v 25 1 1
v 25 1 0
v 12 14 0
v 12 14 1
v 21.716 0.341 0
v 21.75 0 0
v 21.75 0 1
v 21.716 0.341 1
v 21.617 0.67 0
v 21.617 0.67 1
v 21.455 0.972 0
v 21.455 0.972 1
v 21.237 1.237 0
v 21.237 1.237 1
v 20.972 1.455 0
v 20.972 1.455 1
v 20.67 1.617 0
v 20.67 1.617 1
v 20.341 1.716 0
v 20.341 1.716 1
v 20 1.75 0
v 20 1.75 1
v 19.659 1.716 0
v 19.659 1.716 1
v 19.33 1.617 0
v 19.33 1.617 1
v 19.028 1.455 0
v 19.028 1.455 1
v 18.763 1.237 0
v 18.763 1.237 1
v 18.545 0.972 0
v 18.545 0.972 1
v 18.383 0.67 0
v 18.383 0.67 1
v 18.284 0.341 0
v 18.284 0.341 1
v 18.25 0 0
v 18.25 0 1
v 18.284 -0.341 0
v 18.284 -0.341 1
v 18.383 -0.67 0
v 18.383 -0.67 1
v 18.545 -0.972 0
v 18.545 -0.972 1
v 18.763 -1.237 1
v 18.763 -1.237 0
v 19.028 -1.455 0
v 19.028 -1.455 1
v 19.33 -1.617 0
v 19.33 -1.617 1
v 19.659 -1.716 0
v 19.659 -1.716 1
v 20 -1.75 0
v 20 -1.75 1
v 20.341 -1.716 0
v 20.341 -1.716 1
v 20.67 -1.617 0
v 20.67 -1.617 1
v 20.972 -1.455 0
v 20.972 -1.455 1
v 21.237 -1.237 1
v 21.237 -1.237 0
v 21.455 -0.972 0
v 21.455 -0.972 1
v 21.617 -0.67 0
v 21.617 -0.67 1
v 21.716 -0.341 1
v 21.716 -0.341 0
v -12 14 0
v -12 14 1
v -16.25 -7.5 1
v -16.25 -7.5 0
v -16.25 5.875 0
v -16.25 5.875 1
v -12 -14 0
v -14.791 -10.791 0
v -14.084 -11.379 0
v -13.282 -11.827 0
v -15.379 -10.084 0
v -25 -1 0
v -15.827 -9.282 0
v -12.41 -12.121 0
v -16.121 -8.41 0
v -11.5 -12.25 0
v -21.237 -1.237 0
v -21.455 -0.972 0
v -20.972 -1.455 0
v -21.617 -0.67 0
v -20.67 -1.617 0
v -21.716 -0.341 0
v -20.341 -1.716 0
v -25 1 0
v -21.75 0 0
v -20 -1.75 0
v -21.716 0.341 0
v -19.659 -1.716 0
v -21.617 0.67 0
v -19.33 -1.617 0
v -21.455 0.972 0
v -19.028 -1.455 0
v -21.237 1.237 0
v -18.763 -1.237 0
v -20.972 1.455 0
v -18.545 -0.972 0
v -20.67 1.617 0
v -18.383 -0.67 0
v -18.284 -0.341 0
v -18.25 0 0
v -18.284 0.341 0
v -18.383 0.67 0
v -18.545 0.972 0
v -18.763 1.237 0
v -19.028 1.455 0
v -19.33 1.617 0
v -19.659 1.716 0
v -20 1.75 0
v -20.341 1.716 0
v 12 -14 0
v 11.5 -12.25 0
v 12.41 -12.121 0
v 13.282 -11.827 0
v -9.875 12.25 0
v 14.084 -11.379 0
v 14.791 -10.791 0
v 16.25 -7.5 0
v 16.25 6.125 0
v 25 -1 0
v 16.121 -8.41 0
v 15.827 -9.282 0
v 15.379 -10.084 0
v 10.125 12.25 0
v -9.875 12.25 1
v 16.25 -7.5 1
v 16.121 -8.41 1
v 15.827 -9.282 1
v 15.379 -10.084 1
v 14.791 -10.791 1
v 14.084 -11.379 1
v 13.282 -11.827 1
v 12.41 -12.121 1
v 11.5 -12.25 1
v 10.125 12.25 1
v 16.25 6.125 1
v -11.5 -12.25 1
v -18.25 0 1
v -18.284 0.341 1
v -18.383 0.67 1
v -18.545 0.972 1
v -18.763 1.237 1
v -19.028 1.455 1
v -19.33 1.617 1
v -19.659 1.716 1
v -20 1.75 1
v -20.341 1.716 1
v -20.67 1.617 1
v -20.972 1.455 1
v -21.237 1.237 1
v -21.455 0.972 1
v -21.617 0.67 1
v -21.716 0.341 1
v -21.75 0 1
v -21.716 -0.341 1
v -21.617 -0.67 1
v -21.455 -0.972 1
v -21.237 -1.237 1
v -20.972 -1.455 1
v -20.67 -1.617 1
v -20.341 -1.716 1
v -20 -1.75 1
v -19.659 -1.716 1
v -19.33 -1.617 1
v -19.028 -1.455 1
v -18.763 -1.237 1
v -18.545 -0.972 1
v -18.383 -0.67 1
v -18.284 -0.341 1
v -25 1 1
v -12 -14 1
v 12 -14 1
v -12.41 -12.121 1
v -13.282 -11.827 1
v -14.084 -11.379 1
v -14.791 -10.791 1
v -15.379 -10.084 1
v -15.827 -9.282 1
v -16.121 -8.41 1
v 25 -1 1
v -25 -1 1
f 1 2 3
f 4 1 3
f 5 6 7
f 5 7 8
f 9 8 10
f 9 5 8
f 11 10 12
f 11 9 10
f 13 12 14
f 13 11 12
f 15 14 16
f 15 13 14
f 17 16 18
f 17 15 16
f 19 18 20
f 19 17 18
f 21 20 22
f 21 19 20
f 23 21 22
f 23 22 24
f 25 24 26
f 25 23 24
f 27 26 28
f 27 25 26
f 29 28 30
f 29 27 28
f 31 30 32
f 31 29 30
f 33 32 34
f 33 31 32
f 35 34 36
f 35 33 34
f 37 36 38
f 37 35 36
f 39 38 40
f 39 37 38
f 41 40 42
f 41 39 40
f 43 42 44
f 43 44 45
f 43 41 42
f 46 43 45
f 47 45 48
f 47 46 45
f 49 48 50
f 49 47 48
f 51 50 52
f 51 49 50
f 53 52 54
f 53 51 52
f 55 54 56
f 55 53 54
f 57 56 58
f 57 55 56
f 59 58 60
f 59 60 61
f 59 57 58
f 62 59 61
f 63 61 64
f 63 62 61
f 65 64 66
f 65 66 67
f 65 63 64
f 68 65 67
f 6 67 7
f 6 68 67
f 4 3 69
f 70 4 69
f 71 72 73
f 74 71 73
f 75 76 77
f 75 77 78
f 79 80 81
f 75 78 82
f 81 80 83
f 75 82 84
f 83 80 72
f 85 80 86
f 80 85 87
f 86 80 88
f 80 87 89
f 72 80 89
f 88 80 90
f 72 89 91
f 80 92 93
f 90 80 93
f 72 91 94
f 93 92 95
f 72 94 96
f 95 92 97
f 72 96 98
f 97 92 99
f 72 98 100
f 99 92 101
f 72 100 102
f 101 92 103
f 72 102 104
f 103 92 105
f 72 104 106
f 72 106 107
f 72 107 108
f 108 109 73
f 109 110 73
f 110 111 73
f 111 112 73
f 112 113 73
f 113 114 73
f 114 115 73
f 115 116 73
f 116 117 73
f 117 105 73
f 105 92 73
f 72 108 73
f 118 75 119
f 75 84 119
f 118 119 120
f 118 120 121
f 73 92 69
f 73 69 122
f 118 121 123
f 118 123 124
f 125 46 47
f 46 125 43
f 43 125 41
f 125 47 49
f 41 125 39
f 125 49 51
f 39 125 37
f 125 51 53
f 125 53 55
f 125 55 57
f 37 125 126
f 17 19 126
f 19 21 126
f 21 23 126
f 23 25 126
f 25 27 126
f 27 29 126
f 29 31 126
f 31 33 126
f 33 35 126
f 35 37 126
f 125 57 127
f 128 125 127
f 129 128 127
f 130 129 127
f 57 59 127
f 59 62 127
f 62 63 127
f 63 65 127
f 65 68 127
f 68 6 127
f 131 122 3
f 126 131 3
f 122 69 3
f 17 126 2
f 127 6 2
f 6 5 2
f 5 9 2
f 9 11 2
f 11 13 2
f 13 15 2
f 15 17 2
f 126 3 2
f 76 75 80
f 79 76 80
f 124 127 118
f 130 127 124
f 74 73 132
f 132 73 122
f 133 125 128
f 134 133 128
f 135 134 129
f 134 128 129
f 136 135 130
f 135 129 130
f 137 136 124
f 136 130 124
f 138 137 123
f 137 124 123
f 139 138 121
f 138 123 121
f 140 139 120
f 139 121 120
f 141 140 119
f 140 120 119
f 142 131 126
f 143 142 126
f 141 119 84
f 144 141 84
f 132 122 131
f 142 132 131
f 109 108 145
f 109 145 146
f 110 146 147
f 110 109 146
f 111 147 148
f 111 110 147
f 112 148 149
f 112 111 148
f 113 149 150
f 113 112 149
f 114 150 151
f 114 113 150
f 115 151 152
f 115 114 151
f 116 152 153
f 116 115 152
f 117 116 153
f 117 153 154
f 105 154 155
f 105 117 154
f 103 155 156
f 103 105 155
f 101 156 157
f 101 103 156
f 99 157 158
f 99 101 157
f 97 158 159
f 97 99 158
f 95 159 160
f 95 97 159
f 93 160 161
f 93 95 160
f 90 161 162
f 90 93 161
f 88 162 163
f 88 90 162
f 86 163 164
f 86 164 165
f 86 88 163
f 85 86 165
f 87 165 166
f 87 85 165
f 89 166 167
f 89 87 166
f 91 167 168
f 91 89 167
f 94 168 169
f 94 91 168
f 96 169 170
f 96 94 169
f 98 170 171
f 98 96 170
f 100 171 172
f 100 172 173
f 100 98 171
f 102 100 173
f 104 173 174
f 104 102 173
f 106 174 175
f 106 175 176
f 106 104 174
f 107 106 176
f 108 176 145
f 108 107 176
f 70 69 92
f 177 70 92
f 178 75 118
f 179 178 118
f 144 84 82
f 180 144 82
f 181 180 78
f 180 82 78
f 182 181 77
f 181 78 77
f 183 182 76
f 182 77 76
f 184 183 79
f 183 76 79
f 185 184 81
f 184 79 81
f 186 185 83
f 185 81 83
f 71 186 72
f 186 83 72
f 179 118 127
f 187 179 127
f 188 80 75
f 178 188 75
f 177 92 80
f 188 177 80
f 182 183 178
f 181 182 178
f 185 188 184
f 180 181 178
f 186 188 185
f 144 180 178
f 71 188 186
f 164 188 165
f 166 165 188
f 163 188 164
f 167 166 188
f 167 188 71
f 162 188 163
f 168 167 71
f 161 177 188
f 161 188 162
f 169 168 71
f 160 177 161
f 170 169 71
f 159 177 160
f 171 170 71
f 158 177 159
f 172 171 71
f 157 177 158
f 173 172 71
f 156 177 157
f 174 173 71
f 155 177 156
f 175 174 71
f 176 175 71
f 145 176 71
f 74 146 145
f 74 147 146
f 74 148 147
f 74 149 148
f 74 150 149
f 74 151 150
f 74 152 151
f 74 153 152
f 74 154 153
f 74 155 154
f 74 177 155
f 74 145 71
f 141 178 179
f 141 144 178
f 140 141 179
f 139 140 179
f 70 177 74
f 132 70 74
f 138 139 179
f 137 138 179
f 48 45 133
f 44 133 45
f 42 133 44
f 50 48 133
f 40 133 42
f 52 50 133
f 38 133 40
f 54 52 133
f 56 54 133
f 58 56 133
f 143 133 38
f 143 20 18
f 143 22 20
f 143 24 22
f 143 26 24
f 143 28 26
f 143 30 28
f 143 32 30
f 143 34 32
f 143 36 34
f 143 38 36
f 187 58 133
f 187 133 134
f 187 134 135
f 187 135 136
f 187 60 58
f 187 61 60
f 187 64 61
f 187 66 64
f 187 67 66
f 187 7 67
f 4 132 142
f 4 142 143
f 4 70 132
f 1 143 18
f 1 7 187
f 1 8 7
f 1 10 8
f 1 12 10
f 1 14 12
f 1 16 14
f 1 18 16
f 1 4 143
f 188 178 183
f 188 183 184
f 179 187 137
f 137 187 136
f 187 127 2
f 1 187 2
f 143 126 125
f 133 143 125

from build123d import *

# Parameters (mm, degrees)
F0_R     = 1.75
F1_DEPTH = 1


with BuildPart() as f1:
    # F0 (on Top) → F1 (new body)
    with BuildSketch(Plane.XY):
        Polygon((12, 14), (-12, 14), (-25, 1), (-25, -1), (-12, -14), (12, -14), (25, -1), (25, 1), align=None)
        with Locations((-20, 0)):
            Circle(F0_R, mode=Mode.SUBTRACT)
        with BuildLine():
            Line((-16.25, 5.875), (-9.875, 12.25))
            Line((-9.875, 12.25), (10.125, 12.25))
            Line((10.125, 12.25), (16.25, 6.125))
            Line((16.25, 6.125), (16.25, -7.5))
            ThreePointArc((16.25, -7.5), (14.791493, -10.791493), (11.5, -12.25))
            Line((11.5, -12.25), (-11.5, -12.25))
            ThreePointArc((-11.5, -12.25), (-14.791493, -10.791493), (-16.25, -7.5))
            Line((-16.25, -7.5), (-16.25, 5.875))
        make_face(mode=Mode.SUBTRACT)
        with Locations((20, 0)):
            Circle(F0_R, mode=Mode.SUBTRACT)
    extrude(amount=F1_DEPTH)


solid = f1.part
